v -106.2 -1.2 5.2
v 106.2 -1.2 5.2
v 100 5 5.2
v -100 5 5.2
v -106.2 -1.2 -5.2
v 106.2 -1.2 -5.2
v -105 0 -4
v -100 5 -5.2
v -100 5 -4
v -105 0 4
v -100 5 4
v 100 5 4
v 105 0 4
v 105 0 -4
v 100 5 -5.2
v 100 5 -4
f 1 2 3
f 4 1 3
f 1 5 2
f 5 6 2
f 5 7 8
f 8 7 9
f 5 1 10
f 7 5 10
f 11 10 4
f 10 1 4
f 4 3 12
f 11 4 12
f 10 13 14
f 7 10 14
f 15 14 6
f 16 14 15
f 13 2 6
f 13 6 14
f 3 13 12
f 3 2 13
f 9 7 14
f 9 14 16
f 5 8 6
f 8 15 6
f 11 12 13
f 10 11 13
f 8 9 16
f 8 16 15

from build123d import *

# Parameters (mm, degrees)
BOSS_EXTRUDE1_DEPTH = 106.2
CUT_EXTRUDE1_DEPTH  = 11.4


with BuildPart() as part:
    # Sketch1 → Boss-Extrude1 (new body, symmetric)
    with BuildSketch(Plane(origin=(0, 0, 0), x_dir=(0, 0, -1), z_dir=(1, 0, 0))):
        Polygon((-4, 5), (-4, 0), (4, 0), (4, 5), (5.2, 5), (5.2, -1.2), (-5.2, -1.2), (-5.2, 5), align=None)
    extrude(amount=BOSS_EXTRUDE1_DEPTH, both=True)

    # Sketch3 → Cut-Extrude1 (cut, through all)
    with BuildSketch(Plane.XY.offset(5.2)):
        Polygon((-106.2, 5), (-106.2, -1.2), (-100, 5), align=None)
        Polygon((106.2, 5), (106.2, -1.2), (100, 5), align=None)
    extrude(amount=-CUT_EXTRUDE1_DEPTH, mode=Mode.SUBTRACT)


solid = part.part
